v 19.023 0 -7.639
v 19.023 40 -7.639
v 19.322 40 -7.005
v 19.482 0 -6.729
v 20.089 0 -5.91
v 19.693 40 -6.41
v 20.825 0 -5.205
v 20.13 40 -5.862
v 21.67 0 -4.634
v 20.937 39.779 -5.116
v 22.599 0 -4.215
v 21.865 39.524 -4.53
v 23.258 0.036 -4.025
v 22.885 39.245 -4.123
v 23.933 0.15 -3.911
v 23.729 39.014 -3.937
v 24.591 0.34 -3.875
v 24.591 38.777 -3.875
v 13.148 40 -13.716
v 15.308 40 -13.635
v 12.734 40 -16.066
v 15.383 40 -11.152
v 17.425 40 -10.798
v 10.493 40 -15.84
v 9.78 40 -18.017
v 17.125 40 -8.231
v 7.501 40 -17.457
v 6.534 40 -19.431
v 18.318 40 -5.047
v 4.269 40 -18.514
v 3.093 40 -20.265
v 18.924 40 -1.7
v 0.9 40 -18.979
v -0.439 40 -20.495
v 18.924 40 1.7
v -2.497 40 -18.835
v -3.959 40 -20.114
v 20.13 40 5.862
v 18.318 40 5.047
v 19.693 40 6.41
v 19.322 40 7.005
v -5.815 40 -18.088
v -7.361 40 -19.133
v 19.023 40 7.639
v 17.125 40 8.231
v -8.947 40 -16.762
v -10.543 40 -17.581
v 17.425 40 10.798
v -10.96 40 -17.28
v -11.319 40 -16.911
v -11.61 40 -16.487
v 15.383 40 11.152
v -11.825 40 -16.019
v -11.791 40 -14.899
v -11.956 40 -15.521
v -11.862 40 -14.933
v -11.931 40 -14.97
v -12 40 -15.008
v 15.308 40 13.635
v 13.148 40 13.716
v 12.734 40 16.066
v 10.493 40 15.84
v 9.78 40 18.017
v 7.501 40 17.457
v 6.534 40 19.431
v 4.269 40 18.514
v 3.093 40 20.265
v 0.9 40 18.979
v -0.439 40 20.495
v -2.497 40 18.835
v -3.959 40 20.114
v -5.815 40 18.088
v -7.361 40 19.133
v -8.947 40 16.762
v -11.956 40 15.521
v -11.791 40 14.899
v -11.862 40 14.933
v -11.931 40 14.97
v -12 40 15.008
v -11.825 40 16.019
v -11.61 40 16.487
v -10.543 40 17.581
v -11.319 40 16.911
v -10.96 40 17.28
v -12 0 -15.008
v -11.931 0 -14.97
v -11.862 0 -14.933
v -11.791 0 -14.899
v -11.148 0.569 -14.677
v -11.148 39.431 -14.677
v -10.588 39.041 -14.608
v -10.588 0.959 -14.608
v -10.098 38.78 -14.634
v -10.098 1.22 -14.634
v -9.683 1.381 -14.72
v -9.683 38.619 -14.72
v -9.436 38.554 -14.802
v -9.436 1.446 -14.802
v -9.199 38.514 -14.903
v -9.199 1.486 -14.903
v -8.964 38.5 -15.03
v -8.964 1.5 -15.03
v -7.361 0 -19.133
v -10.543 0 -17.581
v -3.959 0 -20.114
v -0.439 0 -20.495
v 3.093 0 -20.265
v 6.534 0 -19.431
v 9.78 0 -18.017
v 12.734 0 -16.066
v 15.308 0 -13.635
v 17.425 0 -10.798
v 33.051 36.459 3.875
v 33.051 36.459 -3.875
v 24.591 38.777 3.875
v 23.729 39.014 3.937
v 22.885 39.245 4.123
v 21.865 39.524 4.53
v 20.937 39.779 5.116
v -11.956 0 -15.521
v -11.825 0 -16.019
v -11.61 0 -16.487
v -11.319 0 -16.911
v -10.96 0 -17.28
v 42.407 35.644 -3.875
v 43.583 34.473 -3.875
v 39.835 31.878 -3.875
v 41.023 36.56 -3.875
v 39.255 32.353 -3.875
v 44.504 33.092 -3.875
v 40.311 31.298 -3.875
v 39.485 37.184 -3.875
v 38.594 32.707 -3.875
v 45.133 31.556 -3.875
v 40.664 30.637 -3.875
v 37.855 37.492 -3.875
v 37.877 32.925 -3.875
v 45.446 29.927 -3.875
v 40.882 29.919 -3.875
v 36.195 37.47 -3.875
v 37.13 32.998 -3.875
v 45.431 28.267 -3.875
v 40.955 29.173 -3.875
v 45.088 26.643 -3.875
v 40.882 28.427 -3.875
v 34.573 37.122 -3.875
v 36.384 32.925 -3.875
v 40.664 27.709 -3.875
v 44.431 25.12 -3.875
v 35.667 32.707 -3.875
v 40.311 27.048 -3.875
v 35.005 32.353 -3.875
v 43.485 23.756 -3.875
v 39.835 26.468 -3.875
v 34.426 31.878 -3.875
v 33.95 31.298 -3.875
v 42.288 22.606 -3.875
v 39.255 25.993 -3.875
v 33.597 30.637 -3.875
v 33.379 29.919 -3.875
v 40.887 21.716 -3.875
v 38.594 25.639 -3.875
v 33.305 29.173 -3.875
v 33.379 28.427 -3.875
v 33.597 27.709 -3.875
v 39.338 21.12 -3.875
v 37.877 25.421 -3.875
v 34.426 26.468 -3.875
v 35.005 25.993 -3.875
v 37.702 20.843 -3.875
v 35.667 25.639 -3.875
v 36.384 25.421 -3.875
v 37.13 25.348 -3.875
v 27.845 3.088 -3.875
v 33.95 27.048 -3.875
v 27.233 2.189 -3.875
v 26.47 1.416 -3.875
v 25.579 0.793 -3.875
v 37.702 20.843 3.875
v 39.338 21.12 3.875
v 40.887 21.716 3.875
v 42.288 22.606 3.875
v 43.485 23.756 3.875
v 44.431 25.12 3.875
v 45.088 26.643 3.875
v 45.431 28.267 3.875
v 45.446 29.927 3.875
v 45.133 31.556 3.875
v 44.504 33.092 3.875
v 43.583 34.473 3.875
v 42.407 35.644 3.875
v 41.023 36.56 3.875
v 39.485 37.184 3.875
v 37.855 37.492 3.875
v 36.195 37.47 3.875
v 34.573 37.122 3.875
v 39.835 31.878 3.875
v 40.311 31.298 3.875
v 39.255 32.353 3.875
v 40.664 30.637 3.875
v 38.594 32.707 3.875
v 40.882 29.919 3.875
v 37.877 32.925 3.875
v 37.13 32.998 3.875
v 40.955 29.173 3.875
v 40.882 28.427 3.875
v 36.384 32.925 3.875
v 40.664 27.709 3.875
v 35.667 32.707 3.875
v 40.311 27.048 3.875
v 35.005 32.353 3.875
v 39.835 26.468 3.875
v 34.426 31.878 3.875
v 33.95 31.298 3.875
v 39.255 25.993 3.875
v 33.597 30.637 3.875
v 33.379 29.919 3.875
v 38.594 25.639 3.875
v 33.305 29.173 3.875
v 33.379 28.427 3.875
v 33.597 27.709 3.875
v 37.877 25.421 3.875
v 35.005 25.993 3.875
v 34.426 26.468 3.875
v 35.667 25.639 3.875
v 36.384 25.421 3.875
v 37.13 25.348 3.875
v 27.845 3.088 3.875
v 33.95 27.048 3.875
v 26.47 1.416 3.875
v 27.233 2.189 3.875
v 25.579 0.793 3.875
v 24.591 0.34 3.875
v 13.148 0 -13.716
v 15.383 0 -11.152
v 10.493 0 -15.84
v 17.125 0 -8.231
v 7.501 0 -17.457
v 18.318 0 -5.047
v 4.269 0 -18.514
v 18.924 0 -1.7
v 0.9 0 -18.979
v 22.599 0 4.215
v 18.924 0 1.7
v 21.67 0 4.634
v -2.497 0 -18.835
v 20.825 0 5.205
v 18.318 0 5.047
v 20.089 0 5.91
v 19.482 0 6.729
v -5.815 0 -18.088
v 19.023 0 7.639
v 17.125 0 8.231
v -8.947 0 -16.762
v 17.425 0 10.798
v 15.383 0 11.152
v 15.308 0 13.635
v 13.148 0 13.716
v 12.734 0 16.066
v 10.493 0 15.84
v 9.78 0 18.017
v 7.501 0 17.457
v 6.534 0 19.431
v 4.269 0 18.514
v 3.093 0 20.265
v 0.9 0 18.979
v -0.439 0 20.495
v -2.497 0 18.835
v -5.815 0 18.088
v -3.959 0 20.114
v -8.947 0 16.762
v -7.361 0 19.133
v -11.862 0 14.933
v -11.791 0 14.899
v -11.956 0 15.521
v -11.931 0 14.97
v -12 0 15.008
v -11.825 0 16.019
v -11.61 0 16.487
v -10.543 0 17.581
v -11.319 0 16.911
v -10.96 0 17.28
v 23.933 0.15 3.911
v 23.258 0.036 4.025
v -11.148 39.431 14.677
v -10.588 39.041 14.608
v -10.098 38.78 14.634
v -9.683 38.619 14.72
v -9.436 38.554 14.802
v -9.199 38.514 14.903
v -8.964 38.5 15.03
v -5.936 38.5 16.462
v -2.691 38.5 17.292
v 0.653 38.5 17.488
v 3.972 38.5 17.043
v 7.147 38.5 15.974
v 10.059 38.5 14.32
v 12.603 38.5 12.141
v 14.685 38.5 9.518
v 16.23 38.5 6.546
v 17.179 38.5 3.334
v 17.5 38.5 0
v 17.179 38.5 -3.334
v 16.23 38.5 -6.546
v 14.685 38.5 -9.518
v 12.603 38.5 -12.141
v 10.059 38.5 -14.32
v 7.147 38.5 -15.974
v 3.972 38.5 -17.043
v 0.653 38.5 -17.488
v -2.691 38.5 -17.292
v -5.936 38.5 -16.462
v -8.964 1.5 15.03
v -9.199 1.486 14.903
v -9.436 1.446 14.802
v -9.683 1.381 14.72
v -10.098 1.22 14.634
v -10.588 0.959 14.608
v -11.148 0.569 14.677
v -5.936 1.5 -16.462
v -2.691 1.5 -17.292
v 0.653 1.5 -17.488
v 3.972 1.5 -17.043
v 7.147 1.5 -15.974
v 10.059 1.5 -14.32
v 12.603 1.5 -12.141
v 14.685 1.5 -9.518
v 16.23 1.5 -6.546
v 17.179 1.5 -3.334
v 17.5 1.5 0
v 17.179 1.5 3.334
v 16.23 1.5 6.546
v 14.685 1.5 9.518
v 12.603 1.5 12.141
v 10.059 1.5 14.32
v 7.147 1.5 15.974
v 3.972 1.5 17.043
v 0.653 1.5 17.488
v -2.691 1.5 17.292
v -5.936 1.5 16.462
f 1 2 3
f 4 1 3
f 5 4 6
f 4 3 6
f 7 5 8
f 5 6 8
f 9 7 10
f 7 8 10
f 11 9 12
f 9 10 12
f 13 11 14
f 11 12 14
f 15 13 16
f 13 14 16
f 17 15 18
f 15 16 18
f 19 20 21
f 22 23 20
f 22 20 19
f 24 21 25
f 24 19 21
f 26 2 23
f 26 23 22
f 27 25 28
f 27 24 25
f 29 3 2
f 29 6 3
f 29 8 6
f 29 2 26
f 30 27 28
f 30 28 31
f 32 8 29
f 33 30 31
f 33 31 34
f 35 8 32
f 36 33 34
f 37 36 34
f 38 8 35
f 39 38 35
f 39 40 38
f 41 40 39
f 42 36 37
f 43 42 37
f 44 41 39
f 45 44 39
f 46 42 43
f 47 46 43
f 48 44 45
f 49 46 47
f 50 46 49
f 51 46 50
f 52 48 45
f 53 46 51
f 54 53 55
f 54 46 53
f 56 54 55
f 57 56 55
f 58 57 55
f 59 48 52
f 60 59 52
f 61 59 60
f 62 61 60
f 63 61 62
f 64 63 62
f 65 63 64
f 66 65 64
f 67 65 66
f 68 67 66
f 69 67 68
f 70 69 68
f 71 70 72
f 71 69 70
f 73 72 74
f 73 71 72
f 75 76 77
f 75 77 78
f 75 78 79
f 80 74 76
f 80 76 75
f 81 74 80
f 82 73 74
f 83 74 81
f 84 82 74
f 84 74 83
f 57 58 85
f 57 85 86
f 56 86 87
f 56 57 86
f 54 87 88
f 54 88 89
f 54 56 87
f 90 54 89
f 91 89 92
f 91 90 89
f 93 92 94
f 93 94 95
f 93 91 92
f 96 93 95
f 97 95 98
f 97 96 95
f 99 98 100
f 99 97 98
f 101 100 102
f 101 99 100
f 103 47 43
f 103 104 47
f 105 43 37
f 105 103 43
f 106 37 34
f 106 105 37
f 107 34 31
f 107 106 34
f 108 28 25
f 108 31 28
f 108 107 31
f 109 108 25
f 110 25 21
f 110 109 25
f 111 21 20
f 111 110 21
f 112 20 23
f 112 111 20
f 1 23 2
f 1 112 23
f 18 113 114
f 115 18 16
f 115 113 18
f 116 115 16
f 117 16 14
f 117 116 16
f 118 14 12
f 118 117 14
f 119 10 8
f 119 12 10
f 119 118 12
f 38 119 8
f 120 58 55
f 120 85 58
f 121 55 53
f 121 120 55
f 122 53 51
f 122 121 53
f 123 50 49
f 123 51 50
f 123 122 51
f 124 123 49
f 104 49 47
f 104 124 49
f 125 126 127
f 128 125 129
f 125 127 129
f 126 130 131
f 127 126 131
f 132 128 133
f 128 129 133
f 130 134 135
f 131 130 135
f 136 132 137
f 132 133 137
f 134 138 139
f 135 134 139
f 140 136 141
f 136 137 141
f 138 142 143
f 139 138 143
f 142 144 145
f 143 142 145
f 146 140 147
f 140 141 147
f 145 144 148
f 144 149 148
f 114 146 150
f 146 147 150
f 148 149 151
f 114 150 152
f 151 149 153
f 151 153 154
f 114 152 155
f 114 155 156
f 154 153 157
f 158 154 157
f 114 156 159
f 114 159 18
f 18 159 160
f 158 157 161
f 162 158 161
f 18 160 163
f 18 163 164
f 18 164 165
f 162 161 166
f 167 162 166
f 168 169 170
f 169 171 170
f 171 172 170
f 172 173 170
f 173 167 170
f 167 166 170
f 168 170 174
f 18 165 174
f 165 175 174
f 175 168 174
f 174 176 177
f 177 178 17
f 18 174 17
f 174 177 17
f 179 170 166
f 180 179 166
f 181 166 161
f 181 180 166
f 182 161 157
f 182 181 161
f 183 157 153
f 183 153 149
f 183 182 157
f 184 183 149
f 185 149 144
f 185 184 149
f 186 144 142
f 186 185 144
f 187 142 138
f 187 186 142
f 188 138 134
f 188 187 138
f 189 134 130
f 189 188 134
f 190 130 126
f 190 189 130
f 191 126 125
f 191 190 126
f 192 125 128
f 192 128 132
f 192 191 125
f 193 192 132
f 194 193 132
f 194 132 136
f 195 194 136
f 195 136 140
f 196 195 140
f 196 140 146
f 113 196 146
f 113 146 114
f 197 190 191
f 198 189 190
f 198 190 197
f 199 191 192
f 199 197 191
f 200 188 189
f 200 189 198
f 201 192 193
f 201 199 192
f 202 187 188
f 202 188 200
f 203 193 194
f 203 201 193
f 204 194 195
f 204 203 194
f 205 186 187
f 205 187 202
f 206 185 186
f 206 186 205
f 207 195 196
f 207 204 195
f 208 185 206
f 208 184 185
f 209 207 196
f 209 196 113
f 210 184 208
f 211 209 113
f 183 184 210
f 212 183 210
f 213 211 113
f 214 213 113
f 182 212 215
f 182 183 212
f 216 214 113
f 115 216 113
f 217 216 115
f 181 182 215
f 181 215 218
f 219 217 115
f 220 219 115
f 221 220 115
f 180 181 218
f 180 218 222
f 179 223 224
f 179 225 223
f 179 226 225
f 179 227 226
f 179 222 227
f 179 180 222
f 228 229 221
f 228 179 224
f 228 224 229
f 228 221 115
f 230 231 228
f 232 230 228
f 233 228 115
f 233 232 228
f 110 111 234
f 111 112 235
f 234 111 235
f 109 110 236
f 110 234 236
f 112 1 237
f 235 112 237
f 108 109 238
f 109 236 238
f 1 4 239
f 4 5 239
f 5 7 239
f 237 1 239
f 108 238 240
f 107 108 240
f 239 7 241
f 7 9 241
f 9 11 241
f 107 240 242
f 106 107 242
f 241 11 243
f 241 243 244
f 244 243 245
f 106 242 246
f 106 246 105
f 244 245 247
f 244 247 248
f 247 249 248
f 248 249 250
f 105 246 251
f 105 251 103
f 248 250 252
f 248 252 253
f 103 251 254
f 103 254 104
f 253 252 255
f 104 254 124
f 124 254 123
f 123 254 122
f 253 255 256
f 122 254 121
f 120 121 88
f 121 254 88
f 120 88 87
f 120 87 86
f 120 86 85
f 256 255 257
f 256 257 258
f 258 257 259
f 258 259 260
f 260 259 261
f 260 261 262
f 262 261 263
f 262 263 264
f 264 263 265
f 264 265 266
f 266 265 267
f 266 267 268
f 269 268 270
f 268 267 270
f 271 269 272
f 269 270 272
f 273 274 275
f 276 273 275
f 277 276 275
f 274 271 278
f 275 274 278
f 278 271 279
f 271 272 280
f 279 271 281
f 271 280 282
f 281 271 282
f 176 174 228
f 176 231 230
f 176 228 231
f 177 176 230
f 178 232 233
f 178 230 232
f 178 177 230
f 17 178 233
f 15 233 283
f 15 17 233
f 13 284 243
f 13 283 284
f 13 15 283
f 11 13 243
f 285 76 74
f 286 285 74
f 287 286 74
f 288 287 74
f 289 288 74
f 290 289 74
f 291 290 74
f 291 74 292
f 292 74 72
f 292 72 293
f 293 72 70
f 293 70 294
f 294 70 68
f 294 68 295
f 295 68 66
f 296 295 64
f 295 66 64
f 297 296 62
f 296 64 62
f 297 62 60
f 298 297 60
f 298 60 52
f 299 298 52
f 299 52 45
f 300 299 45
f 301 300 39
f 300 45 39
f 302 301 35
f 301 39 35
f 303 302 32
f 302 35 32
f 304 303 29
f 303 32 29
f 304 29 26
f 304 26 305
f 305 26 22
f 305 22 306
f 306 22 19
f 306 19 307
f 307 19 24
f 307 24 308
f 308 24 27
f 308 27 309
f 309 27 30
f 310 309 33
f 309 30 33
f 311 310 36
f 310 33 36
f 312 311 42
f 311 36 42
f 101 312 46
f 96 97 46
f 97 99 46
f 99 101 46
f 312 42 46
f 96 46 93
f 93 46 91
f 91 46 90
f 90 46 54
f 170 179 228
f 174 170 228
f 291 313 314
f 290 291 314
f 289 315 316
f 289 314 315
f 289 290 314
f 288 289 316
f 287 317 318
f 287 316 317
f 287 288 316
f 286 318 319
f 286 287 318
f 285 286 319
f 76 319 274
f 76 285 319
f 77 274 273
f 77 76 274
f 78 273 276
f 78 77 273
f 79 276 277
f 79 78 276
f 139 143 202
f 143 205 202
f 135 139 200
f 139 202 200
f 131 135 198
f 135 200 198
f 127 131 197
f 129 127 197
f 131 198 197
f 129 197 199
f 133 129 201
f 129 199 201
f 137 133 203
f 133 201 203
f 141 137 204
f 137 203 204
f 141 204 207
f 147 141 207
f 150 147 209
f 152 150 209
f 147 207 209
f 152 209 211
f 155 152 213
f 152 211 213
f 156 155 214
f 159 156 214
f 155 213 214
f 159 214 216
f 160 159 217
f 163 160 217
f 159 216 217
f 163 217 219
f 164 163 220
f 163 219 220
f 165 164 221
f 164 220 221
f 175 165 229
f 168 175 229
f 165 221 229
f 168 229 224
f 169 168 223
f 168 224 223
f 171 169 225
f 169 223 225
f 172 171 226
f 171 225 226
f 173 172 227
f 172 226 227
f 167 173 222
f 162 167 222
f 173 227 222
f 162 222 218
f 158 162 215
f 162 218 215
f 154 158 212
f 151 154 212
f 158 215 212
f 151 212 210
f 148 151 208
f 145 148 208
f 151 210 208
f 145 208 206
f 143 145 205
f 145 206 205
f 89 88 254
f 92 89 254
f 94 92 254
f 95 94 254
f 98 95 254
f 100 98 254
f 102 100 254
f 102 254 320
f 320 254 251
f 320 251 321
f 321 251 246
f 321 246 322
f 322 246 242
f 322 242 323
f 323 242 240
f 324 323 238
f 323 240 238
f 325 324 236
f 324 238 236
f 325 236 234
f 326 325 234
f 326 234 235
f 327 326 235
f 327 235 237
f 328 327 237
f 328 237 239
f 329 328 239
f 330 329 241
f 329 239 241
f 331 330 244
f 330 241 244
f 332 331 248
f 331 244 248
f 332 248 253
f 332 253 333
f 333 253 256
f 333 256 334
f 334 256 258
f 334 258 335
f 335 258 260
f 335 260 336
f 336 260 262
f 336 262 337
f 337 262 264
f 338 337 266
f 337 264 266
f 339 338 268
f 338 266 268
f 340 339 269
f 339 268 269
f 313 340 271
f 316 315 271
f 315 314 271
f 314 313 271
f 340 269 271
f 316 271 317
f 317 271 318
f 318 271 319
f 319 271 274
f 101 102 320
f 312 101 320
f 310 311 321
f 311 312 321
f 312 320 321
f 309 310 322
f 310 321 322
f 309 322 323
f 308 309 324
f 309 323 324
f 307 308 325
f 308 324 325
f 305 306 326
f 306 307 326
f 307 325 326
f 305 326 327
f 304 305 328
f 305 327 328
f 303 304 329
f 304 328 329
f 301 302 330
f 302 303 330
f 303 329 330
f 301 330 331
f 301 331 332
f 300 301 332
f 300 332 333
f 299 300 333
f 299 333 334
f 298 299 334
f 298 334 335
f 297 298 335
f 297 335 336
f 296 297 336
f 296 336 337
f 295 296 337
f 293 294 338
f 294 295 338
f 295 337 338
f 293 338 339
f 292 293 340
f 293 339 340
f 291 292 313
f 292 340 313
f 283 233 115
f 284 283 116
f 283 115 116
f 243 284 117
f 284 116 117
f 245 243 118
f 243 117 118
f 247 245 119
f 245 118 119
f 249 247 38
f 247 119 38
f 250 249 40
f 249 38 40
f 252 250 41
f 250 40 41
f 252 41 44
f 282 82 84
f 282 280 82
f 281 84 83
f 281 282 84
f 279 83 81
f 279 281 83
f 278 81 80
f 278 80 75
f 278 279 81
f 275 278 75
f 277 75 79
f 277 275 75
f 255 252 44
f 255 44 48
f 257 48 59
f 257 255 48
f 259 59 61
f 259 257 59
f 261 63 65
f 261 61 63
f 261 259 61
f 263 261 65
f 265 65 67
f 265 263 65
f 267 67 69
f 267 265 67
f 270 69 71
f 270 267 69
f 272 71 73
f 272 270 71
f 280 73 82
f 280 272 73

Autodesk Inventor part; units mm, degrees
ref_plane "XZ Plane" through (0, 0, 0) normal (0, 1, 0) x (-1, 0, 0)
ref_plane "XY Plane" through (0, 0, 0) normal (0, 0, 1) x (1, 0, 0)
sketch "Sketch1" plane through (0, 0, 0) normal (0, 1, 0) x (-1, 0, 0)
  circle A0 centre (0, 0) radius 17.5
  arc A1 (-20.1304, -3.875) -> (-20.1304, 3.875) centre (0, 0) ccw
  line L0 (-20.5, -3.875) -> (-20.5, -13.4374) construction
  line L1 (-20.5, -13.4374) -> (-20.5, 14.7091) construction
  line L2 (-47.5, 3.875) -> (-47.5, -3.875)
  line L3 (-47.5, -3.875) -> (-20.1304, -3.875)
  line L4 (0, 0) -> (-47.4736, 0) construction
  line L5 (-47.5, 3.875) -> (-20.1304, 3.875)
  dimension "d0" = 35
  dimension "d1" = 3
  dimension "d4" = 27
extrude "Extrusion1" add sketch "Sketch1" along normal blind 40
sketch "Sketch2" plane through (20.1304, 0, 3.875) normal (0, 0, 1) x (1, 0, 0)
  line L0 (27.3696, 0) -> (27.3696, 40) projected
  line L1 (2, 40) -> (27.3696, 40)
  line L2 (17.5718, 20.8426) -> (6, 0)
  line L3 (27.3696, 0) -> (0, 0) projected
  line L4 (27.3696, 0) -> (27.3696, 40) projected
  line L5 (6, 0) -> (27.3696, 0)
  line L6 (27.3696, 0) -> (27.3696, 28)
  line L7 (0, 0) -> (0, 40) projected
  arc A0 (17.5718, 20.8426) -> (12.9208, 36.4588) centre (17, 29.173) ccw
  line L8 (12.9208, 36.4588) -> (0, 40)
  circle A1 centre (17, 29.173) radius 3.825
  line L9 (0, 40) -> (27.3696, 40)
  line L10 (27.3696, 0) -> (6, 0)
  point P0 (-20.1304, 0)
  dimension "d10" = 6
  dimension "d14" = 16.7
  dimension "d15" = 17
  dimension "d16" = 7.65
extrude "Extrusion2" cut sketch "Sketch2" against normal blind 40 contours L3 L2 A0 L8 L9 L1 L0 | A1
ref_plane "Work Plane1" through (-12, 0, 0) normal (1, 0, 0) x (0, 1, 0)
split "Split1" plane through (-12, 0, 0) removes the side toward (-1, 0, 0)
chamfer "Chamfer1" distance 1.5 angle 45 1 edges at (17.5, 0, 0)
chamfer "Chamfer2" distance 1.5 angle 45 1 edges at (17.5, 40, 0)
fillet "Fillet1" radius 6 1 edges at (20.1304, 20, 3.875)
fillet "Fillet2" radius 6 1 edges at (20.1304, 20, -3.875)
fillet "Fillet3" radius 6 1 edges at (26.1304, 0, 0)
fillet "Fillet4" radius 3 2 edges at (-12, 20, -16.6208) (-12, 20, 16.6208)
fillet_without_effect "Fillet5"
fillet "Fillet6" radius 3 2 edges at (-12, 20, -12.7377) (-12, 20, 12.7377)
properties part number "Radio Mic Holder"
